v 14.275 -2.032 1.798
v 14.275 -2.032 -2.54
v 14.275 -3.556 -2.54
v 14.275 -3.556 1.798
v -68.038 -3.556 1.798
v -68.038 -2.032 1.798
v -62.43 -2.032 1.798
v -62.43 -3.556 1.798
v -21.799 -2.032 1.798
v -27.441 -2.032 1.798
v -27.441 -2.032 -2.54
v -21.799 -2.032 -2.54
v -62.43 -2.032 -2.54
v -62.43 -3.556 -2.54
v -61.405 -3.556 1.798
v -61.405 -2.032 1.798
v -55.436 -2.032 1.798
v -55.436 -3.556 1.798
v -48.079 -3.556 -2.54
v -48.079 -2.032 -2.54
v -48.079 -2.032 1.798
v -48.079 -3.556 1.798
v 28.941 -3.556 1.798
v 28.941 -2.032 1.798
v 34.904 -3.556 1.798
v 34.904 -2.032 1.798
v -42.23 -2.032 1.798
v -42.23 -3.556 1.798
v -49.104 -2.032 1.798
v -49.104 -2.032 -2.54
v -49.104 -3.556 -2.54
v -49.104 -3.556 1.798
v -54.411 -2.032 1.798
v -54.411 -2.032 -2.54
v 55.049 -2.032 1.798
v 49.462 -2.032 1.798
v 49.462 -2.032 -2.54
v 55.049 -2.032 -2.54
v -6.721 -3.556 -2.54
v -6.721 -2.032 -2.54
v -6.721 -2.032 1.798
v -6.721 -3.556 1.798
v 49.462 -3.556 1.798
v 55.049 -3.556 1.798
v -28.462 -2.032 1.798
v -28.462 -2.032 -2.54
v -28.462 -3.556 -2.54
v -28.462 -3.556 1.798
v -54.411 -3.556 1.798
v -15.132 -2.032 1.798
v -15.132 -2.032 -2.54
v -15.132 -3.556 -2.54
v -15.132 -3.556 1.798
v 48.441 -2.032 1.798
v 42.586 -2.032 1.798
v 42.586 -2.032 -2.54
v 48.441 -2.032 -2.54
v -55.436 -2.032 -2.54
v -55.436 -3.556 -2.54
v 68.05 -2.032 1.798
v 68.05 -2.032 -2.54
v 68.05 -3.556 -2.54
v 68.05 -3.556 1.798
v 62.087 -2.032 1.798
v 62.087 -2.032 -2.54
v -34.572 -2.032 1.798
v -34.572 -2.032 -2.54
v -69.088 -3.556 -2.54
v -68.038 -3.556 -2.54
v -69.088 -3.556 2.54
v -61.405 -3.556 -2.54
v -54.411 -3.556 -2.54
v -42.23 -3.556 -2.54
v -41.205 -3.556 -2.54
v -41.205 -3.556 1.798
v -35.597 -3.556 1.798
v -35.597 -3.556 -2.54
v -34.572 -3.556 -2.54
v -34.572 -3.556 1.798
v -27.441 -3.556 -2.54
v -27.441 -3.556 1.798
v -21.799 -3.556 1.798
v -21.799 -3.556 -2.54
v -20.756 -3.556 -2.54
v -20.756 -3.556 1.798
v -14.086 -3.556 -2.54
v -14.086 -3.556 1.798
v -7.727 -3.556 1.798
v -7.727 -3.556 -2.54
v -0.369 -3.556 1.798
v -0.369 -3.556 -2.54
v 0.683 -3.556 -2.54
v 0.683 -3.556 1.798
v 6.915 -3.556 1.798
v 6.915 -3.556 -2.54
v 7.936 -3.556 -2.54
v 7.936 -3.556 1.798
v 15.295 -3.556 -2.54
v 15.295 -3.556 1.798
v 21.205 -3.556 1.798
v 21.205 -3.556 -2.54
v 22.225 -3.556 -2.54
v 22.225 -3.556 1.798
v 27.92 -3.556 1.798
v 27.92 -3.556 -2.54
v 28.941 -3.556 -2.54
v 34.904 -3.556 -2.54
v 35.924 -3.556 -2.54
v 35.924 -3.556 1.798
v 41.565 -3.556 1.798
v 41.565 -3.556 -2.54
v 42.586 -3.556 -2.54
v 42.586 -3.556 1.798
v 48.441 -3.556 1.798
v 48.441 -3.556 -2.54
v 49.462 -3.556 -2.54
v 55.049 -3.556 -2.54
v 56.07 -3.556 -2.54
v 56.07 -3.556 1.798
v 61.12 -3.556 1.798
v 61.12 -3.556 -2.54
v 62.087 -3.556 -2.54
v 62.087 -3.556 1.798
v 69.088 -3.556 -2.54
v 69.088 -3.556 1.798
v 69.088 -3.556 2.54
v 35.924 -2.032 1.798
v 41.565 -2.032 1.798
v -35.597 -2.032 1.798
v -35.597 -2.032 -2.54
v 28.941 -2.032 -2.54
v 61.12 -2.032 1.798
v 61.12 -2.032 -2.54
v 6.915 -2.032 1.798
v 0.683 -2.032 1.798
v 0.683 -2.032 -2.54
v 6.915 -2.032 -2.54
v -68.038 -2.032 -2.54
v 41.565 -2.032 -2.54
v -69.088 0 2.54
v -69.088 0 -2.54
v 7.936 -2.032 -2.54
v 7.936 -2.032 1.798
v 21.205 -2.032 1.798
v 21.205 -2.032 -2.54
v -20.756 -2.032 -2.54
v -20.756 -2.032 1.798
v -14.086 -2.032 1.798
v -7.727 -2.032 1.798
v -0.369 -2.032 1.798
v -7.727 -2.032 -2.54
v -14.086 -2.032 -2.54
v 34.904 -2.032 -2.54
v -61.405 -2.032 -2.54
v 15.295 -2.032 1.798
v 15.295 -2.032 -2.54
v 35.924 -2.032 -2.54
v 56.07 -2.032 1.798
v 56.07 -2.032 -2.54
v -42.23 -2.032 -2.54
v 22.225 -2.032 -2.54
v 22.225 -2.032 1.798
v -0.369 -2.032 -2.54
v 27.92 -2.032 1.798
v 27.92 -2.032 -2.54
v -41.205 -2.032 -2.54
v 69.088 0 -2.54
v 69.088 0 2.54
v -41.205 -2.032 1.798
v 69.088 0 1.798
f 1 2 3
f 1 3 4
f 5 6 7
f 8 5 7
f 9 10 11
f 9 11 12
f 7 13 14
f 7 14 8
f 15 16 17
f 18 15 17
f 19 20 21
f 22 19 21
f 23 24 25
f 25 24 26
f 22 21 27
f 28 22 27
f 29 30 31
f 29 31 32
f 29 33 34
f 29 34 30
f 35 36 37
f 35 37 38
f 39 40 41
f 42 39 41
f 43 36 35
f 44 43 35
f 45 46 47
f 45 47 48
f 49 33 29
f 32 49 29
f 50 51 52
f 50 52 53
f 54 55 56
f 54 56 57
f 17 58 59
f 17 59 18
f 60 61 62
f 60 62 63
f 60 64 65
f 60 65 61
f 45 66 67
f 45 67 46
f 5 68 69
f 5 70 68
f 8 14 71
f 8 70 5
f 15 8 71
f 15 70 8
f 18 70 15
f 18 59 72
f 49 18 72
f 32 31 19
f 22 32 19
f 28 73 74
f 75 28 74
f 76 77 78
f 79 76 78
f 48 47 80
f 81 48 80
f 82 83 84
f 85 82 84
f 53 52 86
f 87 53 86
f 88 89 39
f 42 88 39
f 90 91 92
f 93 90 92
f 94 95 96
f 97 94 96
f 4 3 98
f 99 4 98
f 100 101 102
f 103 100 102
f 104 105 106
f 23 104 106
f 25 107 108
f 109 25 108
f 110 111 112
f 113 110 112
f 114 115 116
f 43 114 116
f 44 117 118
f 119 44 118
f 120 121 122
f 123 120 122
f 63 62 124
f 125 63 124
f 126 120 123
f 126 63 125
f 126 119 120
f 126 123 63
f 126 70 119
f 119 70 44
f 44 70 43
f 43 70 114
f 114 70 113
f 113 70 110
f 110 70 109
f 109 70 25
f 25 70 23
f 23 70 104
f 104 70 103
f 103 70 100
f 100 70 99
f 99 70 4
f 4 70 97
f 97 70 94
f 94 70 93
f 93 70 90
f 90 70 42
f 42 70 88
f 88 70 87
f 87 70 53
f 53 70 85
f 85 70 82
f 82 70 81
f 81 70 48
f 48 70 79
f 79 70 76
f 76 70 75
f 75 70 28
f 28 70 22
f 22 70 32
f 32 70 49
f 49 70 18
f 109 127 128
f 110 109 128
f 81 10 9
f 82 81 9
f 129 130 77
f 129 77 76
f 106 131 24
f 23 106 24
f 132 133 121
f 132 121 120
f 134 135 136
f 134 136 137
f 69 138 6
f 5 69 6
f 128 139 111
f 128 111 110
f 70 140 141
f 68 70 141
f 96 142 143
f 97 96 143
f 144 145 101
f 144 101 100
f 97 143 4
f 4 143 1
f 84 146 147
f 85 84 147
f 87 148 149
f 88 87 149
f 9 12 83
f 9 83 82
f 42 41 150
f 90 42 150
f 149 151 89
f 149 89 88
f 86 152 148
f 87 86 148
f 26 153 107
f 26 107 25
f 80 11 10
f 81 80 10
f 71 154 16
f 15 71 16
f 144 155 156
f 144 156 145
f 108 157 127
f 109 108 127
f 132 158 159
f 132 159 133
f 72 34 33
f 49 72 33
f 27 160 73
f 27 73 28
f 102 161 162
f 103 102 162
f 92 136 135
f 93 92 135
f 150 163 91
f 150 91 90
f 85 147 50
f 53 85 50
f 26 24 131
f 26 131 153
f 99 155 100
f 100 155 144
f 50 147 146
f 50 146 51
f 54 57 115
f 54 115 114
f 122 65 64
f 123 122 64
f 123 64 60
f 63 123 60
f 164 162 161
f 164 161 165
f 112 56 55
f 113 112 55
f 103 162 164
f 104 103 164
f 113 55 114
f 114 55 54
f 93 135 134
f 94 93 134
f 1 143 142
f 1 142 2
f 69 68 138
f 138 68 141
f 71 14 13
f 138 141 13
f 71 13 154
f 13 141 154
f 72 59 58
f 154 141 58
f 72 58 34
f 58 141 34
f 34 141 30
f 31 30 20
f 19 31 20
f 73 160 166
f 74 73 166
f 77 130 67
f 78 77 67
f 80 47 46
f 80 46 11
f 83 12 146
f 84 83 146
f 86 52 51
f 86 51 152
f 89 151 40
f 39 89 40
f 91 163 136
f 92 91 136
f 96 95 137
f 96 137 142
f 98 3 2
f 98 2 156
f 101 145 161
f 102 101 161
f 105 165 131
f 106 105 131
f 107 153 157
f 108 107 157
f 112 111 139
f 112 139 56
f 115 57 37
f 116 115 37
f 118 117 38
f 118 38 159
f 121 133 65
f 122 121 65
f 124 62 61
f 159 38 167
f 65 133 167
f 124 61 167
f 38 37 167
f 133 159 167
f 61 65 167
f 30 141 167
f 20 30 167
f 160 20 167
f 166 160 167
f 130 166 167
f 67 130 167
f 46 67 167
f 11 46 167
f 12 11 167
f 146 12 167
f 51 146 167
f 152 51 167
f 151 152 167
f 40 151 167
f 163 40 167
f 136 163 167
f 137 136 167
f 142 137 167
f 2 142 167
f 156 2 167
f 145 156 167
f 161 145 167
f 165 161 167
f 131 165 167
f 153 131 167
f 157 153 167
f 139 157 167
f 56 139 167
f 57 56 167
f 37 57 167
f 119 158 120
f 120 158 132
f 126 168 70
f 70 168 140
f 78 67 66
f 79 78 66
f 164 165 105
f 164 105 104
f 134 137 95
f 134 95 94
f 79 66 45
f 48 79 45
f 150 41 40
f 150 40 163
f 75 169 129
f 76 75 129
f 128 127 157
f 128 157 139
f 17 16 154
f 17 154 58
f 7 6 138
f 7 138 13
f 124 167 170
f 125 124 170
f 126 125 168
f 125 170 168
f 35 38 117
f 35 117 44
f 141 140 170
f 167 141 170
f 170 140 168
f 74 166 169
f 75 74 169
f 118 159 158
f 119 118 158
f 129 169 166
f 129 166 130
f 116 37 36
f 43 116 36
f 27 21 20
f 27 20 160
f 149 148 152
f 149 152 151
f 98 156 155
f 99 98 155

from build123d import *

# Parameters (mm, degrees)
F0_W     = 1.0496481662
F0_H     = 4.3377888929
F0_W_2   = 1.0251030326
F0_W_3   = 1.02070719
F0_W_4   = 1.0432768613
F0_W_5   = 1.0463846847
F0_W_6   = 1.0061389767
F0_W_7   = 1.0521755321
F0_W_8   = 1.0207062587
F0_W_9   = 1.0207053274
F0_W_10  = 1.0207034647
F0_W_11  = 0.9669847786
F0_W_12  = 1.0382413273
F1_DEPTH = 3.556
F0_W_13  = 5.6079216301
F0_W_14  = 5.9697218239
F0_W_15  = 5.3064189851
F0_W_16  = 5.8491192758
F0_W_17  = 6.1098765582
F0_W_18  = 5.6421123445
F0_W_19  = 5.6237019598
F0_W_20  = 6.3587981276
F0_W_21  = 6.3517062808
F0_W_22  = 6.2316799886
F0_W_23  = 6.3391225412
F0_W_24  = 5.909351632
F0_W_25  = 5.6944675744
F0_W_26  = 5.9630740434
F0_W_27  = 5.640745163
F0_W_28  = 5.8556310833
F0_W_29  = 5.5870227516
F0_W_30  = 5.0498098135
F0_W_31  = 5.963075906
F2_DEPTH = 2.032


with BuildPart() as f1:
    # F0 (on Front) → F1 (new body)
    with BuildSketch(Plane.XZ):
        with Locations((-68.5631759169, -0.3711055536)):
            Rectangle(F0_W, F0_H)
        Polygon((69.088, 1.7977888929), (69.088, 2.54), (-69.088, 2.54), (-69.088, 1.7977888929), (-68.0383518338, 1.7977888929), (-62.4304302037, 1.7977888929), (-61.4053271711, 1.7977888929), (-55.4356053472, 1.7977888929), (-54.4105023146, 1.7977888929), (-49.1040833294, 1.7977888929), (-48.0789802969, 1.7977888929), (-42.229861021, 1.7977888929), (-41.2047579885, 1.7977888929), (-35.5968363583, 1.7977888929), (-34.5717333257, 1.7977888929), (-28.4618567675, 1.7977888929), (-27.4411495775, 1.7977888929), (-21.799037233, 1.7977888929), (-20.7557603717, 1.7977888929), (-15.1320584118, 1.7977888929), (-14.0856737271, 1.7977888929), (-7.7268755995, 1.7977888929), (-6.7207366228, 1.7977888929), (-0.369030342, 1.7977888929), (0.6831451901, 1.7977888929), (6.9148251787, 1.7977888929), (7.9355314374, 1.7977888929), (14.2746539786, 1.7977888929), (15.2953602374, 1.7977888929), (21.2047118694, 1.7977888929), (22.2254171968, 1.7977888929), (27.9198847711, 1.7977888929), (28.9405900985, 1.7977888929), (34.9036641419, 1.7977888929), (35.9243713319, 1.7977888929), (41.5651164949, 1.7977888929), (42.5858236849, 1.7977888929), (48.4414547682, 1.7977888929), (49.4621582329, 1.7977888929), (55.0491809845, 1.7977888929), (56.0698881745, 1.7977888929), (61.119697988, 1.7977888929), (62.0866827667, 1.7977888929), (68.0497586727, 1.7977888929), align=None)
        with Locations((-61.9178786874, -0.3711055536)):
            Rectangle(F0_W_2, F0_H)
        with Locations((-54.9230538309, -0.3711055536)):
            Rectangle(F0_W_2, F0_H)
        with Locations((-48.5915318131, -0.3711055536)):
            Rectangle(F0_W_2, F0_H)
        with Locations((-41.7173095047, -0.3711055536)):
            Rectangle(F0_W_2, F0_H)
        with Locations((-35.084284842, -0.3711055536)):
            Rectangle(F0_W_2, F0_H)
        with Locations((-27.9515031725, -0.3711055536)):
            Rectangle(F0_W_3, F0_H)
        with Locations((-21.2773988023, -0.3711055536)):
            Rectangle(F0_W_4, F0_H)
        with Locations((-14.6088660695, -0.3711055536)):
            Rectangle(F0_W_5, F0_H)
        with Locations((-7.2238061111, -0.3711055536)):
            Rectangle(F0_W_6, F0_H)
        with Locations((0.1570574241, -0.3711055536)):
            Rectangle(F0_W_7, F0_H)
        with Locations((7.425178308, -0.3711055536)):
            Rectangle(F0_W_8, F0_H)
        with Locations((14.785007108, -0.3711055536)):
            Rectangle(F0_W_8, F0_H)
        with Locations((21.7150645331, -0.3711055536)):
            Rectangle(F0_W_9, F0_H)
        with Locations((28.4302374348, -0.3711055536)):
            Rectangle(F0_W_9, F0_H)
        with Locations((35.4140177369, -0.3711055536)):
            Rectangle(F0_W_3, F0_H)
        with Locations((42.0754700899, -0.3711055536)):
            Rectangle(F0_W_3, F0_H)
        with Locations((48.9518065006, -0.3711055536)):
            Rectangle(F0_W_10, F0_H)
        with Locations((55.5595345795, -0.3711055536)):
            Rectangle(F0_W_3, F0_H)
        with Locations((61.6031903774, -0.3711055536)):
            Rectangle(F0_W_11, F0_H)
        with Locations((68.5688793364, -0.3711055536)):
            Rectangle(F0_W_12, F0_H)
    extrude(amount=F1_DEPTH)

    # F0 (on Front) → F2 (join)
    with BuildSketch(Plane.XZ):
        with Locations((-65.2343910187, -0.3711055536)):
            Rectangle(F0_W_13, F0_H)
        with Locations((-58.4204662591, -0.3711055536)):
            Rectangle(F0_W_14, F0_H)
        with Locations((-51.757292822, -0.3711055536)):
            Rectangle(F0_W_15, F0_H)
        with Locations((-45.1544206589, -0.3711055536)):
            Rectangle(F0_W_16, F0_H)
        with Locations((-38.4007971734, -0.3711055536)):
            Rectangle(F0_W_13, F0_H)
        with Locations((-31.5167950466, -0.3711055536)):
            Rectangle(F0_W_17, F0_H)
        with Locations((-24.6200934052, -0.3711055536)):
            Rectangle(F0_W_18, F0_H)
        with Locations((-17.9439093918, -0.3711055536)):
            Rectangle(F0_W_19, F0_H)
        with Locations((-10.9062746633, -0.3711055536)):
            Rectangle(F0_W_20, F0_H)
        with Locations((-3.5448834824, -0.3711055536)):
            Rectangle(F0_W_21, F0_H)
        with Locations((3.7989851844, -0.3711055536)):
            Rectangle(F0_W_22, F0_H)
        with Locations((11.105092708, -0.3711055536)):
            Rectangle(F0_W_23, F0_H)
        with Locations((18.2500360534, -0.3711055536)):
            Rectangle(F0_W_24, F0_H)
        with Locations((25.0726509839, -0.3711055536)):
            Rectangle(F0_W_25, F0_H)
        with Locations((31.9221271202, -0.3711055536)):
            Rectangle(F0_W_26, F0_H)
        with Locations((38.7447439134, -0.3711055536)):
            Rectangle(F0_W_27, F0_H)
        with Locations((45.5136392266, -0.3711055536)):
            Rectangle(F0_W_28, F0_H)
        with Locations((52.2556696087, -0.3711055536)):
            Rectangle(F0_W_29, F0_H)
        with Locations((58.5947930813, -0.3711055536)):
            Rectangle(F0_W_30, F0_H)
        with Locations((65.0682207197, -0.3711055536)):
            Rectangle(F0_W_31, F0_H)
    extrude(amount=F2_DEPTH)


solid = f1.part
